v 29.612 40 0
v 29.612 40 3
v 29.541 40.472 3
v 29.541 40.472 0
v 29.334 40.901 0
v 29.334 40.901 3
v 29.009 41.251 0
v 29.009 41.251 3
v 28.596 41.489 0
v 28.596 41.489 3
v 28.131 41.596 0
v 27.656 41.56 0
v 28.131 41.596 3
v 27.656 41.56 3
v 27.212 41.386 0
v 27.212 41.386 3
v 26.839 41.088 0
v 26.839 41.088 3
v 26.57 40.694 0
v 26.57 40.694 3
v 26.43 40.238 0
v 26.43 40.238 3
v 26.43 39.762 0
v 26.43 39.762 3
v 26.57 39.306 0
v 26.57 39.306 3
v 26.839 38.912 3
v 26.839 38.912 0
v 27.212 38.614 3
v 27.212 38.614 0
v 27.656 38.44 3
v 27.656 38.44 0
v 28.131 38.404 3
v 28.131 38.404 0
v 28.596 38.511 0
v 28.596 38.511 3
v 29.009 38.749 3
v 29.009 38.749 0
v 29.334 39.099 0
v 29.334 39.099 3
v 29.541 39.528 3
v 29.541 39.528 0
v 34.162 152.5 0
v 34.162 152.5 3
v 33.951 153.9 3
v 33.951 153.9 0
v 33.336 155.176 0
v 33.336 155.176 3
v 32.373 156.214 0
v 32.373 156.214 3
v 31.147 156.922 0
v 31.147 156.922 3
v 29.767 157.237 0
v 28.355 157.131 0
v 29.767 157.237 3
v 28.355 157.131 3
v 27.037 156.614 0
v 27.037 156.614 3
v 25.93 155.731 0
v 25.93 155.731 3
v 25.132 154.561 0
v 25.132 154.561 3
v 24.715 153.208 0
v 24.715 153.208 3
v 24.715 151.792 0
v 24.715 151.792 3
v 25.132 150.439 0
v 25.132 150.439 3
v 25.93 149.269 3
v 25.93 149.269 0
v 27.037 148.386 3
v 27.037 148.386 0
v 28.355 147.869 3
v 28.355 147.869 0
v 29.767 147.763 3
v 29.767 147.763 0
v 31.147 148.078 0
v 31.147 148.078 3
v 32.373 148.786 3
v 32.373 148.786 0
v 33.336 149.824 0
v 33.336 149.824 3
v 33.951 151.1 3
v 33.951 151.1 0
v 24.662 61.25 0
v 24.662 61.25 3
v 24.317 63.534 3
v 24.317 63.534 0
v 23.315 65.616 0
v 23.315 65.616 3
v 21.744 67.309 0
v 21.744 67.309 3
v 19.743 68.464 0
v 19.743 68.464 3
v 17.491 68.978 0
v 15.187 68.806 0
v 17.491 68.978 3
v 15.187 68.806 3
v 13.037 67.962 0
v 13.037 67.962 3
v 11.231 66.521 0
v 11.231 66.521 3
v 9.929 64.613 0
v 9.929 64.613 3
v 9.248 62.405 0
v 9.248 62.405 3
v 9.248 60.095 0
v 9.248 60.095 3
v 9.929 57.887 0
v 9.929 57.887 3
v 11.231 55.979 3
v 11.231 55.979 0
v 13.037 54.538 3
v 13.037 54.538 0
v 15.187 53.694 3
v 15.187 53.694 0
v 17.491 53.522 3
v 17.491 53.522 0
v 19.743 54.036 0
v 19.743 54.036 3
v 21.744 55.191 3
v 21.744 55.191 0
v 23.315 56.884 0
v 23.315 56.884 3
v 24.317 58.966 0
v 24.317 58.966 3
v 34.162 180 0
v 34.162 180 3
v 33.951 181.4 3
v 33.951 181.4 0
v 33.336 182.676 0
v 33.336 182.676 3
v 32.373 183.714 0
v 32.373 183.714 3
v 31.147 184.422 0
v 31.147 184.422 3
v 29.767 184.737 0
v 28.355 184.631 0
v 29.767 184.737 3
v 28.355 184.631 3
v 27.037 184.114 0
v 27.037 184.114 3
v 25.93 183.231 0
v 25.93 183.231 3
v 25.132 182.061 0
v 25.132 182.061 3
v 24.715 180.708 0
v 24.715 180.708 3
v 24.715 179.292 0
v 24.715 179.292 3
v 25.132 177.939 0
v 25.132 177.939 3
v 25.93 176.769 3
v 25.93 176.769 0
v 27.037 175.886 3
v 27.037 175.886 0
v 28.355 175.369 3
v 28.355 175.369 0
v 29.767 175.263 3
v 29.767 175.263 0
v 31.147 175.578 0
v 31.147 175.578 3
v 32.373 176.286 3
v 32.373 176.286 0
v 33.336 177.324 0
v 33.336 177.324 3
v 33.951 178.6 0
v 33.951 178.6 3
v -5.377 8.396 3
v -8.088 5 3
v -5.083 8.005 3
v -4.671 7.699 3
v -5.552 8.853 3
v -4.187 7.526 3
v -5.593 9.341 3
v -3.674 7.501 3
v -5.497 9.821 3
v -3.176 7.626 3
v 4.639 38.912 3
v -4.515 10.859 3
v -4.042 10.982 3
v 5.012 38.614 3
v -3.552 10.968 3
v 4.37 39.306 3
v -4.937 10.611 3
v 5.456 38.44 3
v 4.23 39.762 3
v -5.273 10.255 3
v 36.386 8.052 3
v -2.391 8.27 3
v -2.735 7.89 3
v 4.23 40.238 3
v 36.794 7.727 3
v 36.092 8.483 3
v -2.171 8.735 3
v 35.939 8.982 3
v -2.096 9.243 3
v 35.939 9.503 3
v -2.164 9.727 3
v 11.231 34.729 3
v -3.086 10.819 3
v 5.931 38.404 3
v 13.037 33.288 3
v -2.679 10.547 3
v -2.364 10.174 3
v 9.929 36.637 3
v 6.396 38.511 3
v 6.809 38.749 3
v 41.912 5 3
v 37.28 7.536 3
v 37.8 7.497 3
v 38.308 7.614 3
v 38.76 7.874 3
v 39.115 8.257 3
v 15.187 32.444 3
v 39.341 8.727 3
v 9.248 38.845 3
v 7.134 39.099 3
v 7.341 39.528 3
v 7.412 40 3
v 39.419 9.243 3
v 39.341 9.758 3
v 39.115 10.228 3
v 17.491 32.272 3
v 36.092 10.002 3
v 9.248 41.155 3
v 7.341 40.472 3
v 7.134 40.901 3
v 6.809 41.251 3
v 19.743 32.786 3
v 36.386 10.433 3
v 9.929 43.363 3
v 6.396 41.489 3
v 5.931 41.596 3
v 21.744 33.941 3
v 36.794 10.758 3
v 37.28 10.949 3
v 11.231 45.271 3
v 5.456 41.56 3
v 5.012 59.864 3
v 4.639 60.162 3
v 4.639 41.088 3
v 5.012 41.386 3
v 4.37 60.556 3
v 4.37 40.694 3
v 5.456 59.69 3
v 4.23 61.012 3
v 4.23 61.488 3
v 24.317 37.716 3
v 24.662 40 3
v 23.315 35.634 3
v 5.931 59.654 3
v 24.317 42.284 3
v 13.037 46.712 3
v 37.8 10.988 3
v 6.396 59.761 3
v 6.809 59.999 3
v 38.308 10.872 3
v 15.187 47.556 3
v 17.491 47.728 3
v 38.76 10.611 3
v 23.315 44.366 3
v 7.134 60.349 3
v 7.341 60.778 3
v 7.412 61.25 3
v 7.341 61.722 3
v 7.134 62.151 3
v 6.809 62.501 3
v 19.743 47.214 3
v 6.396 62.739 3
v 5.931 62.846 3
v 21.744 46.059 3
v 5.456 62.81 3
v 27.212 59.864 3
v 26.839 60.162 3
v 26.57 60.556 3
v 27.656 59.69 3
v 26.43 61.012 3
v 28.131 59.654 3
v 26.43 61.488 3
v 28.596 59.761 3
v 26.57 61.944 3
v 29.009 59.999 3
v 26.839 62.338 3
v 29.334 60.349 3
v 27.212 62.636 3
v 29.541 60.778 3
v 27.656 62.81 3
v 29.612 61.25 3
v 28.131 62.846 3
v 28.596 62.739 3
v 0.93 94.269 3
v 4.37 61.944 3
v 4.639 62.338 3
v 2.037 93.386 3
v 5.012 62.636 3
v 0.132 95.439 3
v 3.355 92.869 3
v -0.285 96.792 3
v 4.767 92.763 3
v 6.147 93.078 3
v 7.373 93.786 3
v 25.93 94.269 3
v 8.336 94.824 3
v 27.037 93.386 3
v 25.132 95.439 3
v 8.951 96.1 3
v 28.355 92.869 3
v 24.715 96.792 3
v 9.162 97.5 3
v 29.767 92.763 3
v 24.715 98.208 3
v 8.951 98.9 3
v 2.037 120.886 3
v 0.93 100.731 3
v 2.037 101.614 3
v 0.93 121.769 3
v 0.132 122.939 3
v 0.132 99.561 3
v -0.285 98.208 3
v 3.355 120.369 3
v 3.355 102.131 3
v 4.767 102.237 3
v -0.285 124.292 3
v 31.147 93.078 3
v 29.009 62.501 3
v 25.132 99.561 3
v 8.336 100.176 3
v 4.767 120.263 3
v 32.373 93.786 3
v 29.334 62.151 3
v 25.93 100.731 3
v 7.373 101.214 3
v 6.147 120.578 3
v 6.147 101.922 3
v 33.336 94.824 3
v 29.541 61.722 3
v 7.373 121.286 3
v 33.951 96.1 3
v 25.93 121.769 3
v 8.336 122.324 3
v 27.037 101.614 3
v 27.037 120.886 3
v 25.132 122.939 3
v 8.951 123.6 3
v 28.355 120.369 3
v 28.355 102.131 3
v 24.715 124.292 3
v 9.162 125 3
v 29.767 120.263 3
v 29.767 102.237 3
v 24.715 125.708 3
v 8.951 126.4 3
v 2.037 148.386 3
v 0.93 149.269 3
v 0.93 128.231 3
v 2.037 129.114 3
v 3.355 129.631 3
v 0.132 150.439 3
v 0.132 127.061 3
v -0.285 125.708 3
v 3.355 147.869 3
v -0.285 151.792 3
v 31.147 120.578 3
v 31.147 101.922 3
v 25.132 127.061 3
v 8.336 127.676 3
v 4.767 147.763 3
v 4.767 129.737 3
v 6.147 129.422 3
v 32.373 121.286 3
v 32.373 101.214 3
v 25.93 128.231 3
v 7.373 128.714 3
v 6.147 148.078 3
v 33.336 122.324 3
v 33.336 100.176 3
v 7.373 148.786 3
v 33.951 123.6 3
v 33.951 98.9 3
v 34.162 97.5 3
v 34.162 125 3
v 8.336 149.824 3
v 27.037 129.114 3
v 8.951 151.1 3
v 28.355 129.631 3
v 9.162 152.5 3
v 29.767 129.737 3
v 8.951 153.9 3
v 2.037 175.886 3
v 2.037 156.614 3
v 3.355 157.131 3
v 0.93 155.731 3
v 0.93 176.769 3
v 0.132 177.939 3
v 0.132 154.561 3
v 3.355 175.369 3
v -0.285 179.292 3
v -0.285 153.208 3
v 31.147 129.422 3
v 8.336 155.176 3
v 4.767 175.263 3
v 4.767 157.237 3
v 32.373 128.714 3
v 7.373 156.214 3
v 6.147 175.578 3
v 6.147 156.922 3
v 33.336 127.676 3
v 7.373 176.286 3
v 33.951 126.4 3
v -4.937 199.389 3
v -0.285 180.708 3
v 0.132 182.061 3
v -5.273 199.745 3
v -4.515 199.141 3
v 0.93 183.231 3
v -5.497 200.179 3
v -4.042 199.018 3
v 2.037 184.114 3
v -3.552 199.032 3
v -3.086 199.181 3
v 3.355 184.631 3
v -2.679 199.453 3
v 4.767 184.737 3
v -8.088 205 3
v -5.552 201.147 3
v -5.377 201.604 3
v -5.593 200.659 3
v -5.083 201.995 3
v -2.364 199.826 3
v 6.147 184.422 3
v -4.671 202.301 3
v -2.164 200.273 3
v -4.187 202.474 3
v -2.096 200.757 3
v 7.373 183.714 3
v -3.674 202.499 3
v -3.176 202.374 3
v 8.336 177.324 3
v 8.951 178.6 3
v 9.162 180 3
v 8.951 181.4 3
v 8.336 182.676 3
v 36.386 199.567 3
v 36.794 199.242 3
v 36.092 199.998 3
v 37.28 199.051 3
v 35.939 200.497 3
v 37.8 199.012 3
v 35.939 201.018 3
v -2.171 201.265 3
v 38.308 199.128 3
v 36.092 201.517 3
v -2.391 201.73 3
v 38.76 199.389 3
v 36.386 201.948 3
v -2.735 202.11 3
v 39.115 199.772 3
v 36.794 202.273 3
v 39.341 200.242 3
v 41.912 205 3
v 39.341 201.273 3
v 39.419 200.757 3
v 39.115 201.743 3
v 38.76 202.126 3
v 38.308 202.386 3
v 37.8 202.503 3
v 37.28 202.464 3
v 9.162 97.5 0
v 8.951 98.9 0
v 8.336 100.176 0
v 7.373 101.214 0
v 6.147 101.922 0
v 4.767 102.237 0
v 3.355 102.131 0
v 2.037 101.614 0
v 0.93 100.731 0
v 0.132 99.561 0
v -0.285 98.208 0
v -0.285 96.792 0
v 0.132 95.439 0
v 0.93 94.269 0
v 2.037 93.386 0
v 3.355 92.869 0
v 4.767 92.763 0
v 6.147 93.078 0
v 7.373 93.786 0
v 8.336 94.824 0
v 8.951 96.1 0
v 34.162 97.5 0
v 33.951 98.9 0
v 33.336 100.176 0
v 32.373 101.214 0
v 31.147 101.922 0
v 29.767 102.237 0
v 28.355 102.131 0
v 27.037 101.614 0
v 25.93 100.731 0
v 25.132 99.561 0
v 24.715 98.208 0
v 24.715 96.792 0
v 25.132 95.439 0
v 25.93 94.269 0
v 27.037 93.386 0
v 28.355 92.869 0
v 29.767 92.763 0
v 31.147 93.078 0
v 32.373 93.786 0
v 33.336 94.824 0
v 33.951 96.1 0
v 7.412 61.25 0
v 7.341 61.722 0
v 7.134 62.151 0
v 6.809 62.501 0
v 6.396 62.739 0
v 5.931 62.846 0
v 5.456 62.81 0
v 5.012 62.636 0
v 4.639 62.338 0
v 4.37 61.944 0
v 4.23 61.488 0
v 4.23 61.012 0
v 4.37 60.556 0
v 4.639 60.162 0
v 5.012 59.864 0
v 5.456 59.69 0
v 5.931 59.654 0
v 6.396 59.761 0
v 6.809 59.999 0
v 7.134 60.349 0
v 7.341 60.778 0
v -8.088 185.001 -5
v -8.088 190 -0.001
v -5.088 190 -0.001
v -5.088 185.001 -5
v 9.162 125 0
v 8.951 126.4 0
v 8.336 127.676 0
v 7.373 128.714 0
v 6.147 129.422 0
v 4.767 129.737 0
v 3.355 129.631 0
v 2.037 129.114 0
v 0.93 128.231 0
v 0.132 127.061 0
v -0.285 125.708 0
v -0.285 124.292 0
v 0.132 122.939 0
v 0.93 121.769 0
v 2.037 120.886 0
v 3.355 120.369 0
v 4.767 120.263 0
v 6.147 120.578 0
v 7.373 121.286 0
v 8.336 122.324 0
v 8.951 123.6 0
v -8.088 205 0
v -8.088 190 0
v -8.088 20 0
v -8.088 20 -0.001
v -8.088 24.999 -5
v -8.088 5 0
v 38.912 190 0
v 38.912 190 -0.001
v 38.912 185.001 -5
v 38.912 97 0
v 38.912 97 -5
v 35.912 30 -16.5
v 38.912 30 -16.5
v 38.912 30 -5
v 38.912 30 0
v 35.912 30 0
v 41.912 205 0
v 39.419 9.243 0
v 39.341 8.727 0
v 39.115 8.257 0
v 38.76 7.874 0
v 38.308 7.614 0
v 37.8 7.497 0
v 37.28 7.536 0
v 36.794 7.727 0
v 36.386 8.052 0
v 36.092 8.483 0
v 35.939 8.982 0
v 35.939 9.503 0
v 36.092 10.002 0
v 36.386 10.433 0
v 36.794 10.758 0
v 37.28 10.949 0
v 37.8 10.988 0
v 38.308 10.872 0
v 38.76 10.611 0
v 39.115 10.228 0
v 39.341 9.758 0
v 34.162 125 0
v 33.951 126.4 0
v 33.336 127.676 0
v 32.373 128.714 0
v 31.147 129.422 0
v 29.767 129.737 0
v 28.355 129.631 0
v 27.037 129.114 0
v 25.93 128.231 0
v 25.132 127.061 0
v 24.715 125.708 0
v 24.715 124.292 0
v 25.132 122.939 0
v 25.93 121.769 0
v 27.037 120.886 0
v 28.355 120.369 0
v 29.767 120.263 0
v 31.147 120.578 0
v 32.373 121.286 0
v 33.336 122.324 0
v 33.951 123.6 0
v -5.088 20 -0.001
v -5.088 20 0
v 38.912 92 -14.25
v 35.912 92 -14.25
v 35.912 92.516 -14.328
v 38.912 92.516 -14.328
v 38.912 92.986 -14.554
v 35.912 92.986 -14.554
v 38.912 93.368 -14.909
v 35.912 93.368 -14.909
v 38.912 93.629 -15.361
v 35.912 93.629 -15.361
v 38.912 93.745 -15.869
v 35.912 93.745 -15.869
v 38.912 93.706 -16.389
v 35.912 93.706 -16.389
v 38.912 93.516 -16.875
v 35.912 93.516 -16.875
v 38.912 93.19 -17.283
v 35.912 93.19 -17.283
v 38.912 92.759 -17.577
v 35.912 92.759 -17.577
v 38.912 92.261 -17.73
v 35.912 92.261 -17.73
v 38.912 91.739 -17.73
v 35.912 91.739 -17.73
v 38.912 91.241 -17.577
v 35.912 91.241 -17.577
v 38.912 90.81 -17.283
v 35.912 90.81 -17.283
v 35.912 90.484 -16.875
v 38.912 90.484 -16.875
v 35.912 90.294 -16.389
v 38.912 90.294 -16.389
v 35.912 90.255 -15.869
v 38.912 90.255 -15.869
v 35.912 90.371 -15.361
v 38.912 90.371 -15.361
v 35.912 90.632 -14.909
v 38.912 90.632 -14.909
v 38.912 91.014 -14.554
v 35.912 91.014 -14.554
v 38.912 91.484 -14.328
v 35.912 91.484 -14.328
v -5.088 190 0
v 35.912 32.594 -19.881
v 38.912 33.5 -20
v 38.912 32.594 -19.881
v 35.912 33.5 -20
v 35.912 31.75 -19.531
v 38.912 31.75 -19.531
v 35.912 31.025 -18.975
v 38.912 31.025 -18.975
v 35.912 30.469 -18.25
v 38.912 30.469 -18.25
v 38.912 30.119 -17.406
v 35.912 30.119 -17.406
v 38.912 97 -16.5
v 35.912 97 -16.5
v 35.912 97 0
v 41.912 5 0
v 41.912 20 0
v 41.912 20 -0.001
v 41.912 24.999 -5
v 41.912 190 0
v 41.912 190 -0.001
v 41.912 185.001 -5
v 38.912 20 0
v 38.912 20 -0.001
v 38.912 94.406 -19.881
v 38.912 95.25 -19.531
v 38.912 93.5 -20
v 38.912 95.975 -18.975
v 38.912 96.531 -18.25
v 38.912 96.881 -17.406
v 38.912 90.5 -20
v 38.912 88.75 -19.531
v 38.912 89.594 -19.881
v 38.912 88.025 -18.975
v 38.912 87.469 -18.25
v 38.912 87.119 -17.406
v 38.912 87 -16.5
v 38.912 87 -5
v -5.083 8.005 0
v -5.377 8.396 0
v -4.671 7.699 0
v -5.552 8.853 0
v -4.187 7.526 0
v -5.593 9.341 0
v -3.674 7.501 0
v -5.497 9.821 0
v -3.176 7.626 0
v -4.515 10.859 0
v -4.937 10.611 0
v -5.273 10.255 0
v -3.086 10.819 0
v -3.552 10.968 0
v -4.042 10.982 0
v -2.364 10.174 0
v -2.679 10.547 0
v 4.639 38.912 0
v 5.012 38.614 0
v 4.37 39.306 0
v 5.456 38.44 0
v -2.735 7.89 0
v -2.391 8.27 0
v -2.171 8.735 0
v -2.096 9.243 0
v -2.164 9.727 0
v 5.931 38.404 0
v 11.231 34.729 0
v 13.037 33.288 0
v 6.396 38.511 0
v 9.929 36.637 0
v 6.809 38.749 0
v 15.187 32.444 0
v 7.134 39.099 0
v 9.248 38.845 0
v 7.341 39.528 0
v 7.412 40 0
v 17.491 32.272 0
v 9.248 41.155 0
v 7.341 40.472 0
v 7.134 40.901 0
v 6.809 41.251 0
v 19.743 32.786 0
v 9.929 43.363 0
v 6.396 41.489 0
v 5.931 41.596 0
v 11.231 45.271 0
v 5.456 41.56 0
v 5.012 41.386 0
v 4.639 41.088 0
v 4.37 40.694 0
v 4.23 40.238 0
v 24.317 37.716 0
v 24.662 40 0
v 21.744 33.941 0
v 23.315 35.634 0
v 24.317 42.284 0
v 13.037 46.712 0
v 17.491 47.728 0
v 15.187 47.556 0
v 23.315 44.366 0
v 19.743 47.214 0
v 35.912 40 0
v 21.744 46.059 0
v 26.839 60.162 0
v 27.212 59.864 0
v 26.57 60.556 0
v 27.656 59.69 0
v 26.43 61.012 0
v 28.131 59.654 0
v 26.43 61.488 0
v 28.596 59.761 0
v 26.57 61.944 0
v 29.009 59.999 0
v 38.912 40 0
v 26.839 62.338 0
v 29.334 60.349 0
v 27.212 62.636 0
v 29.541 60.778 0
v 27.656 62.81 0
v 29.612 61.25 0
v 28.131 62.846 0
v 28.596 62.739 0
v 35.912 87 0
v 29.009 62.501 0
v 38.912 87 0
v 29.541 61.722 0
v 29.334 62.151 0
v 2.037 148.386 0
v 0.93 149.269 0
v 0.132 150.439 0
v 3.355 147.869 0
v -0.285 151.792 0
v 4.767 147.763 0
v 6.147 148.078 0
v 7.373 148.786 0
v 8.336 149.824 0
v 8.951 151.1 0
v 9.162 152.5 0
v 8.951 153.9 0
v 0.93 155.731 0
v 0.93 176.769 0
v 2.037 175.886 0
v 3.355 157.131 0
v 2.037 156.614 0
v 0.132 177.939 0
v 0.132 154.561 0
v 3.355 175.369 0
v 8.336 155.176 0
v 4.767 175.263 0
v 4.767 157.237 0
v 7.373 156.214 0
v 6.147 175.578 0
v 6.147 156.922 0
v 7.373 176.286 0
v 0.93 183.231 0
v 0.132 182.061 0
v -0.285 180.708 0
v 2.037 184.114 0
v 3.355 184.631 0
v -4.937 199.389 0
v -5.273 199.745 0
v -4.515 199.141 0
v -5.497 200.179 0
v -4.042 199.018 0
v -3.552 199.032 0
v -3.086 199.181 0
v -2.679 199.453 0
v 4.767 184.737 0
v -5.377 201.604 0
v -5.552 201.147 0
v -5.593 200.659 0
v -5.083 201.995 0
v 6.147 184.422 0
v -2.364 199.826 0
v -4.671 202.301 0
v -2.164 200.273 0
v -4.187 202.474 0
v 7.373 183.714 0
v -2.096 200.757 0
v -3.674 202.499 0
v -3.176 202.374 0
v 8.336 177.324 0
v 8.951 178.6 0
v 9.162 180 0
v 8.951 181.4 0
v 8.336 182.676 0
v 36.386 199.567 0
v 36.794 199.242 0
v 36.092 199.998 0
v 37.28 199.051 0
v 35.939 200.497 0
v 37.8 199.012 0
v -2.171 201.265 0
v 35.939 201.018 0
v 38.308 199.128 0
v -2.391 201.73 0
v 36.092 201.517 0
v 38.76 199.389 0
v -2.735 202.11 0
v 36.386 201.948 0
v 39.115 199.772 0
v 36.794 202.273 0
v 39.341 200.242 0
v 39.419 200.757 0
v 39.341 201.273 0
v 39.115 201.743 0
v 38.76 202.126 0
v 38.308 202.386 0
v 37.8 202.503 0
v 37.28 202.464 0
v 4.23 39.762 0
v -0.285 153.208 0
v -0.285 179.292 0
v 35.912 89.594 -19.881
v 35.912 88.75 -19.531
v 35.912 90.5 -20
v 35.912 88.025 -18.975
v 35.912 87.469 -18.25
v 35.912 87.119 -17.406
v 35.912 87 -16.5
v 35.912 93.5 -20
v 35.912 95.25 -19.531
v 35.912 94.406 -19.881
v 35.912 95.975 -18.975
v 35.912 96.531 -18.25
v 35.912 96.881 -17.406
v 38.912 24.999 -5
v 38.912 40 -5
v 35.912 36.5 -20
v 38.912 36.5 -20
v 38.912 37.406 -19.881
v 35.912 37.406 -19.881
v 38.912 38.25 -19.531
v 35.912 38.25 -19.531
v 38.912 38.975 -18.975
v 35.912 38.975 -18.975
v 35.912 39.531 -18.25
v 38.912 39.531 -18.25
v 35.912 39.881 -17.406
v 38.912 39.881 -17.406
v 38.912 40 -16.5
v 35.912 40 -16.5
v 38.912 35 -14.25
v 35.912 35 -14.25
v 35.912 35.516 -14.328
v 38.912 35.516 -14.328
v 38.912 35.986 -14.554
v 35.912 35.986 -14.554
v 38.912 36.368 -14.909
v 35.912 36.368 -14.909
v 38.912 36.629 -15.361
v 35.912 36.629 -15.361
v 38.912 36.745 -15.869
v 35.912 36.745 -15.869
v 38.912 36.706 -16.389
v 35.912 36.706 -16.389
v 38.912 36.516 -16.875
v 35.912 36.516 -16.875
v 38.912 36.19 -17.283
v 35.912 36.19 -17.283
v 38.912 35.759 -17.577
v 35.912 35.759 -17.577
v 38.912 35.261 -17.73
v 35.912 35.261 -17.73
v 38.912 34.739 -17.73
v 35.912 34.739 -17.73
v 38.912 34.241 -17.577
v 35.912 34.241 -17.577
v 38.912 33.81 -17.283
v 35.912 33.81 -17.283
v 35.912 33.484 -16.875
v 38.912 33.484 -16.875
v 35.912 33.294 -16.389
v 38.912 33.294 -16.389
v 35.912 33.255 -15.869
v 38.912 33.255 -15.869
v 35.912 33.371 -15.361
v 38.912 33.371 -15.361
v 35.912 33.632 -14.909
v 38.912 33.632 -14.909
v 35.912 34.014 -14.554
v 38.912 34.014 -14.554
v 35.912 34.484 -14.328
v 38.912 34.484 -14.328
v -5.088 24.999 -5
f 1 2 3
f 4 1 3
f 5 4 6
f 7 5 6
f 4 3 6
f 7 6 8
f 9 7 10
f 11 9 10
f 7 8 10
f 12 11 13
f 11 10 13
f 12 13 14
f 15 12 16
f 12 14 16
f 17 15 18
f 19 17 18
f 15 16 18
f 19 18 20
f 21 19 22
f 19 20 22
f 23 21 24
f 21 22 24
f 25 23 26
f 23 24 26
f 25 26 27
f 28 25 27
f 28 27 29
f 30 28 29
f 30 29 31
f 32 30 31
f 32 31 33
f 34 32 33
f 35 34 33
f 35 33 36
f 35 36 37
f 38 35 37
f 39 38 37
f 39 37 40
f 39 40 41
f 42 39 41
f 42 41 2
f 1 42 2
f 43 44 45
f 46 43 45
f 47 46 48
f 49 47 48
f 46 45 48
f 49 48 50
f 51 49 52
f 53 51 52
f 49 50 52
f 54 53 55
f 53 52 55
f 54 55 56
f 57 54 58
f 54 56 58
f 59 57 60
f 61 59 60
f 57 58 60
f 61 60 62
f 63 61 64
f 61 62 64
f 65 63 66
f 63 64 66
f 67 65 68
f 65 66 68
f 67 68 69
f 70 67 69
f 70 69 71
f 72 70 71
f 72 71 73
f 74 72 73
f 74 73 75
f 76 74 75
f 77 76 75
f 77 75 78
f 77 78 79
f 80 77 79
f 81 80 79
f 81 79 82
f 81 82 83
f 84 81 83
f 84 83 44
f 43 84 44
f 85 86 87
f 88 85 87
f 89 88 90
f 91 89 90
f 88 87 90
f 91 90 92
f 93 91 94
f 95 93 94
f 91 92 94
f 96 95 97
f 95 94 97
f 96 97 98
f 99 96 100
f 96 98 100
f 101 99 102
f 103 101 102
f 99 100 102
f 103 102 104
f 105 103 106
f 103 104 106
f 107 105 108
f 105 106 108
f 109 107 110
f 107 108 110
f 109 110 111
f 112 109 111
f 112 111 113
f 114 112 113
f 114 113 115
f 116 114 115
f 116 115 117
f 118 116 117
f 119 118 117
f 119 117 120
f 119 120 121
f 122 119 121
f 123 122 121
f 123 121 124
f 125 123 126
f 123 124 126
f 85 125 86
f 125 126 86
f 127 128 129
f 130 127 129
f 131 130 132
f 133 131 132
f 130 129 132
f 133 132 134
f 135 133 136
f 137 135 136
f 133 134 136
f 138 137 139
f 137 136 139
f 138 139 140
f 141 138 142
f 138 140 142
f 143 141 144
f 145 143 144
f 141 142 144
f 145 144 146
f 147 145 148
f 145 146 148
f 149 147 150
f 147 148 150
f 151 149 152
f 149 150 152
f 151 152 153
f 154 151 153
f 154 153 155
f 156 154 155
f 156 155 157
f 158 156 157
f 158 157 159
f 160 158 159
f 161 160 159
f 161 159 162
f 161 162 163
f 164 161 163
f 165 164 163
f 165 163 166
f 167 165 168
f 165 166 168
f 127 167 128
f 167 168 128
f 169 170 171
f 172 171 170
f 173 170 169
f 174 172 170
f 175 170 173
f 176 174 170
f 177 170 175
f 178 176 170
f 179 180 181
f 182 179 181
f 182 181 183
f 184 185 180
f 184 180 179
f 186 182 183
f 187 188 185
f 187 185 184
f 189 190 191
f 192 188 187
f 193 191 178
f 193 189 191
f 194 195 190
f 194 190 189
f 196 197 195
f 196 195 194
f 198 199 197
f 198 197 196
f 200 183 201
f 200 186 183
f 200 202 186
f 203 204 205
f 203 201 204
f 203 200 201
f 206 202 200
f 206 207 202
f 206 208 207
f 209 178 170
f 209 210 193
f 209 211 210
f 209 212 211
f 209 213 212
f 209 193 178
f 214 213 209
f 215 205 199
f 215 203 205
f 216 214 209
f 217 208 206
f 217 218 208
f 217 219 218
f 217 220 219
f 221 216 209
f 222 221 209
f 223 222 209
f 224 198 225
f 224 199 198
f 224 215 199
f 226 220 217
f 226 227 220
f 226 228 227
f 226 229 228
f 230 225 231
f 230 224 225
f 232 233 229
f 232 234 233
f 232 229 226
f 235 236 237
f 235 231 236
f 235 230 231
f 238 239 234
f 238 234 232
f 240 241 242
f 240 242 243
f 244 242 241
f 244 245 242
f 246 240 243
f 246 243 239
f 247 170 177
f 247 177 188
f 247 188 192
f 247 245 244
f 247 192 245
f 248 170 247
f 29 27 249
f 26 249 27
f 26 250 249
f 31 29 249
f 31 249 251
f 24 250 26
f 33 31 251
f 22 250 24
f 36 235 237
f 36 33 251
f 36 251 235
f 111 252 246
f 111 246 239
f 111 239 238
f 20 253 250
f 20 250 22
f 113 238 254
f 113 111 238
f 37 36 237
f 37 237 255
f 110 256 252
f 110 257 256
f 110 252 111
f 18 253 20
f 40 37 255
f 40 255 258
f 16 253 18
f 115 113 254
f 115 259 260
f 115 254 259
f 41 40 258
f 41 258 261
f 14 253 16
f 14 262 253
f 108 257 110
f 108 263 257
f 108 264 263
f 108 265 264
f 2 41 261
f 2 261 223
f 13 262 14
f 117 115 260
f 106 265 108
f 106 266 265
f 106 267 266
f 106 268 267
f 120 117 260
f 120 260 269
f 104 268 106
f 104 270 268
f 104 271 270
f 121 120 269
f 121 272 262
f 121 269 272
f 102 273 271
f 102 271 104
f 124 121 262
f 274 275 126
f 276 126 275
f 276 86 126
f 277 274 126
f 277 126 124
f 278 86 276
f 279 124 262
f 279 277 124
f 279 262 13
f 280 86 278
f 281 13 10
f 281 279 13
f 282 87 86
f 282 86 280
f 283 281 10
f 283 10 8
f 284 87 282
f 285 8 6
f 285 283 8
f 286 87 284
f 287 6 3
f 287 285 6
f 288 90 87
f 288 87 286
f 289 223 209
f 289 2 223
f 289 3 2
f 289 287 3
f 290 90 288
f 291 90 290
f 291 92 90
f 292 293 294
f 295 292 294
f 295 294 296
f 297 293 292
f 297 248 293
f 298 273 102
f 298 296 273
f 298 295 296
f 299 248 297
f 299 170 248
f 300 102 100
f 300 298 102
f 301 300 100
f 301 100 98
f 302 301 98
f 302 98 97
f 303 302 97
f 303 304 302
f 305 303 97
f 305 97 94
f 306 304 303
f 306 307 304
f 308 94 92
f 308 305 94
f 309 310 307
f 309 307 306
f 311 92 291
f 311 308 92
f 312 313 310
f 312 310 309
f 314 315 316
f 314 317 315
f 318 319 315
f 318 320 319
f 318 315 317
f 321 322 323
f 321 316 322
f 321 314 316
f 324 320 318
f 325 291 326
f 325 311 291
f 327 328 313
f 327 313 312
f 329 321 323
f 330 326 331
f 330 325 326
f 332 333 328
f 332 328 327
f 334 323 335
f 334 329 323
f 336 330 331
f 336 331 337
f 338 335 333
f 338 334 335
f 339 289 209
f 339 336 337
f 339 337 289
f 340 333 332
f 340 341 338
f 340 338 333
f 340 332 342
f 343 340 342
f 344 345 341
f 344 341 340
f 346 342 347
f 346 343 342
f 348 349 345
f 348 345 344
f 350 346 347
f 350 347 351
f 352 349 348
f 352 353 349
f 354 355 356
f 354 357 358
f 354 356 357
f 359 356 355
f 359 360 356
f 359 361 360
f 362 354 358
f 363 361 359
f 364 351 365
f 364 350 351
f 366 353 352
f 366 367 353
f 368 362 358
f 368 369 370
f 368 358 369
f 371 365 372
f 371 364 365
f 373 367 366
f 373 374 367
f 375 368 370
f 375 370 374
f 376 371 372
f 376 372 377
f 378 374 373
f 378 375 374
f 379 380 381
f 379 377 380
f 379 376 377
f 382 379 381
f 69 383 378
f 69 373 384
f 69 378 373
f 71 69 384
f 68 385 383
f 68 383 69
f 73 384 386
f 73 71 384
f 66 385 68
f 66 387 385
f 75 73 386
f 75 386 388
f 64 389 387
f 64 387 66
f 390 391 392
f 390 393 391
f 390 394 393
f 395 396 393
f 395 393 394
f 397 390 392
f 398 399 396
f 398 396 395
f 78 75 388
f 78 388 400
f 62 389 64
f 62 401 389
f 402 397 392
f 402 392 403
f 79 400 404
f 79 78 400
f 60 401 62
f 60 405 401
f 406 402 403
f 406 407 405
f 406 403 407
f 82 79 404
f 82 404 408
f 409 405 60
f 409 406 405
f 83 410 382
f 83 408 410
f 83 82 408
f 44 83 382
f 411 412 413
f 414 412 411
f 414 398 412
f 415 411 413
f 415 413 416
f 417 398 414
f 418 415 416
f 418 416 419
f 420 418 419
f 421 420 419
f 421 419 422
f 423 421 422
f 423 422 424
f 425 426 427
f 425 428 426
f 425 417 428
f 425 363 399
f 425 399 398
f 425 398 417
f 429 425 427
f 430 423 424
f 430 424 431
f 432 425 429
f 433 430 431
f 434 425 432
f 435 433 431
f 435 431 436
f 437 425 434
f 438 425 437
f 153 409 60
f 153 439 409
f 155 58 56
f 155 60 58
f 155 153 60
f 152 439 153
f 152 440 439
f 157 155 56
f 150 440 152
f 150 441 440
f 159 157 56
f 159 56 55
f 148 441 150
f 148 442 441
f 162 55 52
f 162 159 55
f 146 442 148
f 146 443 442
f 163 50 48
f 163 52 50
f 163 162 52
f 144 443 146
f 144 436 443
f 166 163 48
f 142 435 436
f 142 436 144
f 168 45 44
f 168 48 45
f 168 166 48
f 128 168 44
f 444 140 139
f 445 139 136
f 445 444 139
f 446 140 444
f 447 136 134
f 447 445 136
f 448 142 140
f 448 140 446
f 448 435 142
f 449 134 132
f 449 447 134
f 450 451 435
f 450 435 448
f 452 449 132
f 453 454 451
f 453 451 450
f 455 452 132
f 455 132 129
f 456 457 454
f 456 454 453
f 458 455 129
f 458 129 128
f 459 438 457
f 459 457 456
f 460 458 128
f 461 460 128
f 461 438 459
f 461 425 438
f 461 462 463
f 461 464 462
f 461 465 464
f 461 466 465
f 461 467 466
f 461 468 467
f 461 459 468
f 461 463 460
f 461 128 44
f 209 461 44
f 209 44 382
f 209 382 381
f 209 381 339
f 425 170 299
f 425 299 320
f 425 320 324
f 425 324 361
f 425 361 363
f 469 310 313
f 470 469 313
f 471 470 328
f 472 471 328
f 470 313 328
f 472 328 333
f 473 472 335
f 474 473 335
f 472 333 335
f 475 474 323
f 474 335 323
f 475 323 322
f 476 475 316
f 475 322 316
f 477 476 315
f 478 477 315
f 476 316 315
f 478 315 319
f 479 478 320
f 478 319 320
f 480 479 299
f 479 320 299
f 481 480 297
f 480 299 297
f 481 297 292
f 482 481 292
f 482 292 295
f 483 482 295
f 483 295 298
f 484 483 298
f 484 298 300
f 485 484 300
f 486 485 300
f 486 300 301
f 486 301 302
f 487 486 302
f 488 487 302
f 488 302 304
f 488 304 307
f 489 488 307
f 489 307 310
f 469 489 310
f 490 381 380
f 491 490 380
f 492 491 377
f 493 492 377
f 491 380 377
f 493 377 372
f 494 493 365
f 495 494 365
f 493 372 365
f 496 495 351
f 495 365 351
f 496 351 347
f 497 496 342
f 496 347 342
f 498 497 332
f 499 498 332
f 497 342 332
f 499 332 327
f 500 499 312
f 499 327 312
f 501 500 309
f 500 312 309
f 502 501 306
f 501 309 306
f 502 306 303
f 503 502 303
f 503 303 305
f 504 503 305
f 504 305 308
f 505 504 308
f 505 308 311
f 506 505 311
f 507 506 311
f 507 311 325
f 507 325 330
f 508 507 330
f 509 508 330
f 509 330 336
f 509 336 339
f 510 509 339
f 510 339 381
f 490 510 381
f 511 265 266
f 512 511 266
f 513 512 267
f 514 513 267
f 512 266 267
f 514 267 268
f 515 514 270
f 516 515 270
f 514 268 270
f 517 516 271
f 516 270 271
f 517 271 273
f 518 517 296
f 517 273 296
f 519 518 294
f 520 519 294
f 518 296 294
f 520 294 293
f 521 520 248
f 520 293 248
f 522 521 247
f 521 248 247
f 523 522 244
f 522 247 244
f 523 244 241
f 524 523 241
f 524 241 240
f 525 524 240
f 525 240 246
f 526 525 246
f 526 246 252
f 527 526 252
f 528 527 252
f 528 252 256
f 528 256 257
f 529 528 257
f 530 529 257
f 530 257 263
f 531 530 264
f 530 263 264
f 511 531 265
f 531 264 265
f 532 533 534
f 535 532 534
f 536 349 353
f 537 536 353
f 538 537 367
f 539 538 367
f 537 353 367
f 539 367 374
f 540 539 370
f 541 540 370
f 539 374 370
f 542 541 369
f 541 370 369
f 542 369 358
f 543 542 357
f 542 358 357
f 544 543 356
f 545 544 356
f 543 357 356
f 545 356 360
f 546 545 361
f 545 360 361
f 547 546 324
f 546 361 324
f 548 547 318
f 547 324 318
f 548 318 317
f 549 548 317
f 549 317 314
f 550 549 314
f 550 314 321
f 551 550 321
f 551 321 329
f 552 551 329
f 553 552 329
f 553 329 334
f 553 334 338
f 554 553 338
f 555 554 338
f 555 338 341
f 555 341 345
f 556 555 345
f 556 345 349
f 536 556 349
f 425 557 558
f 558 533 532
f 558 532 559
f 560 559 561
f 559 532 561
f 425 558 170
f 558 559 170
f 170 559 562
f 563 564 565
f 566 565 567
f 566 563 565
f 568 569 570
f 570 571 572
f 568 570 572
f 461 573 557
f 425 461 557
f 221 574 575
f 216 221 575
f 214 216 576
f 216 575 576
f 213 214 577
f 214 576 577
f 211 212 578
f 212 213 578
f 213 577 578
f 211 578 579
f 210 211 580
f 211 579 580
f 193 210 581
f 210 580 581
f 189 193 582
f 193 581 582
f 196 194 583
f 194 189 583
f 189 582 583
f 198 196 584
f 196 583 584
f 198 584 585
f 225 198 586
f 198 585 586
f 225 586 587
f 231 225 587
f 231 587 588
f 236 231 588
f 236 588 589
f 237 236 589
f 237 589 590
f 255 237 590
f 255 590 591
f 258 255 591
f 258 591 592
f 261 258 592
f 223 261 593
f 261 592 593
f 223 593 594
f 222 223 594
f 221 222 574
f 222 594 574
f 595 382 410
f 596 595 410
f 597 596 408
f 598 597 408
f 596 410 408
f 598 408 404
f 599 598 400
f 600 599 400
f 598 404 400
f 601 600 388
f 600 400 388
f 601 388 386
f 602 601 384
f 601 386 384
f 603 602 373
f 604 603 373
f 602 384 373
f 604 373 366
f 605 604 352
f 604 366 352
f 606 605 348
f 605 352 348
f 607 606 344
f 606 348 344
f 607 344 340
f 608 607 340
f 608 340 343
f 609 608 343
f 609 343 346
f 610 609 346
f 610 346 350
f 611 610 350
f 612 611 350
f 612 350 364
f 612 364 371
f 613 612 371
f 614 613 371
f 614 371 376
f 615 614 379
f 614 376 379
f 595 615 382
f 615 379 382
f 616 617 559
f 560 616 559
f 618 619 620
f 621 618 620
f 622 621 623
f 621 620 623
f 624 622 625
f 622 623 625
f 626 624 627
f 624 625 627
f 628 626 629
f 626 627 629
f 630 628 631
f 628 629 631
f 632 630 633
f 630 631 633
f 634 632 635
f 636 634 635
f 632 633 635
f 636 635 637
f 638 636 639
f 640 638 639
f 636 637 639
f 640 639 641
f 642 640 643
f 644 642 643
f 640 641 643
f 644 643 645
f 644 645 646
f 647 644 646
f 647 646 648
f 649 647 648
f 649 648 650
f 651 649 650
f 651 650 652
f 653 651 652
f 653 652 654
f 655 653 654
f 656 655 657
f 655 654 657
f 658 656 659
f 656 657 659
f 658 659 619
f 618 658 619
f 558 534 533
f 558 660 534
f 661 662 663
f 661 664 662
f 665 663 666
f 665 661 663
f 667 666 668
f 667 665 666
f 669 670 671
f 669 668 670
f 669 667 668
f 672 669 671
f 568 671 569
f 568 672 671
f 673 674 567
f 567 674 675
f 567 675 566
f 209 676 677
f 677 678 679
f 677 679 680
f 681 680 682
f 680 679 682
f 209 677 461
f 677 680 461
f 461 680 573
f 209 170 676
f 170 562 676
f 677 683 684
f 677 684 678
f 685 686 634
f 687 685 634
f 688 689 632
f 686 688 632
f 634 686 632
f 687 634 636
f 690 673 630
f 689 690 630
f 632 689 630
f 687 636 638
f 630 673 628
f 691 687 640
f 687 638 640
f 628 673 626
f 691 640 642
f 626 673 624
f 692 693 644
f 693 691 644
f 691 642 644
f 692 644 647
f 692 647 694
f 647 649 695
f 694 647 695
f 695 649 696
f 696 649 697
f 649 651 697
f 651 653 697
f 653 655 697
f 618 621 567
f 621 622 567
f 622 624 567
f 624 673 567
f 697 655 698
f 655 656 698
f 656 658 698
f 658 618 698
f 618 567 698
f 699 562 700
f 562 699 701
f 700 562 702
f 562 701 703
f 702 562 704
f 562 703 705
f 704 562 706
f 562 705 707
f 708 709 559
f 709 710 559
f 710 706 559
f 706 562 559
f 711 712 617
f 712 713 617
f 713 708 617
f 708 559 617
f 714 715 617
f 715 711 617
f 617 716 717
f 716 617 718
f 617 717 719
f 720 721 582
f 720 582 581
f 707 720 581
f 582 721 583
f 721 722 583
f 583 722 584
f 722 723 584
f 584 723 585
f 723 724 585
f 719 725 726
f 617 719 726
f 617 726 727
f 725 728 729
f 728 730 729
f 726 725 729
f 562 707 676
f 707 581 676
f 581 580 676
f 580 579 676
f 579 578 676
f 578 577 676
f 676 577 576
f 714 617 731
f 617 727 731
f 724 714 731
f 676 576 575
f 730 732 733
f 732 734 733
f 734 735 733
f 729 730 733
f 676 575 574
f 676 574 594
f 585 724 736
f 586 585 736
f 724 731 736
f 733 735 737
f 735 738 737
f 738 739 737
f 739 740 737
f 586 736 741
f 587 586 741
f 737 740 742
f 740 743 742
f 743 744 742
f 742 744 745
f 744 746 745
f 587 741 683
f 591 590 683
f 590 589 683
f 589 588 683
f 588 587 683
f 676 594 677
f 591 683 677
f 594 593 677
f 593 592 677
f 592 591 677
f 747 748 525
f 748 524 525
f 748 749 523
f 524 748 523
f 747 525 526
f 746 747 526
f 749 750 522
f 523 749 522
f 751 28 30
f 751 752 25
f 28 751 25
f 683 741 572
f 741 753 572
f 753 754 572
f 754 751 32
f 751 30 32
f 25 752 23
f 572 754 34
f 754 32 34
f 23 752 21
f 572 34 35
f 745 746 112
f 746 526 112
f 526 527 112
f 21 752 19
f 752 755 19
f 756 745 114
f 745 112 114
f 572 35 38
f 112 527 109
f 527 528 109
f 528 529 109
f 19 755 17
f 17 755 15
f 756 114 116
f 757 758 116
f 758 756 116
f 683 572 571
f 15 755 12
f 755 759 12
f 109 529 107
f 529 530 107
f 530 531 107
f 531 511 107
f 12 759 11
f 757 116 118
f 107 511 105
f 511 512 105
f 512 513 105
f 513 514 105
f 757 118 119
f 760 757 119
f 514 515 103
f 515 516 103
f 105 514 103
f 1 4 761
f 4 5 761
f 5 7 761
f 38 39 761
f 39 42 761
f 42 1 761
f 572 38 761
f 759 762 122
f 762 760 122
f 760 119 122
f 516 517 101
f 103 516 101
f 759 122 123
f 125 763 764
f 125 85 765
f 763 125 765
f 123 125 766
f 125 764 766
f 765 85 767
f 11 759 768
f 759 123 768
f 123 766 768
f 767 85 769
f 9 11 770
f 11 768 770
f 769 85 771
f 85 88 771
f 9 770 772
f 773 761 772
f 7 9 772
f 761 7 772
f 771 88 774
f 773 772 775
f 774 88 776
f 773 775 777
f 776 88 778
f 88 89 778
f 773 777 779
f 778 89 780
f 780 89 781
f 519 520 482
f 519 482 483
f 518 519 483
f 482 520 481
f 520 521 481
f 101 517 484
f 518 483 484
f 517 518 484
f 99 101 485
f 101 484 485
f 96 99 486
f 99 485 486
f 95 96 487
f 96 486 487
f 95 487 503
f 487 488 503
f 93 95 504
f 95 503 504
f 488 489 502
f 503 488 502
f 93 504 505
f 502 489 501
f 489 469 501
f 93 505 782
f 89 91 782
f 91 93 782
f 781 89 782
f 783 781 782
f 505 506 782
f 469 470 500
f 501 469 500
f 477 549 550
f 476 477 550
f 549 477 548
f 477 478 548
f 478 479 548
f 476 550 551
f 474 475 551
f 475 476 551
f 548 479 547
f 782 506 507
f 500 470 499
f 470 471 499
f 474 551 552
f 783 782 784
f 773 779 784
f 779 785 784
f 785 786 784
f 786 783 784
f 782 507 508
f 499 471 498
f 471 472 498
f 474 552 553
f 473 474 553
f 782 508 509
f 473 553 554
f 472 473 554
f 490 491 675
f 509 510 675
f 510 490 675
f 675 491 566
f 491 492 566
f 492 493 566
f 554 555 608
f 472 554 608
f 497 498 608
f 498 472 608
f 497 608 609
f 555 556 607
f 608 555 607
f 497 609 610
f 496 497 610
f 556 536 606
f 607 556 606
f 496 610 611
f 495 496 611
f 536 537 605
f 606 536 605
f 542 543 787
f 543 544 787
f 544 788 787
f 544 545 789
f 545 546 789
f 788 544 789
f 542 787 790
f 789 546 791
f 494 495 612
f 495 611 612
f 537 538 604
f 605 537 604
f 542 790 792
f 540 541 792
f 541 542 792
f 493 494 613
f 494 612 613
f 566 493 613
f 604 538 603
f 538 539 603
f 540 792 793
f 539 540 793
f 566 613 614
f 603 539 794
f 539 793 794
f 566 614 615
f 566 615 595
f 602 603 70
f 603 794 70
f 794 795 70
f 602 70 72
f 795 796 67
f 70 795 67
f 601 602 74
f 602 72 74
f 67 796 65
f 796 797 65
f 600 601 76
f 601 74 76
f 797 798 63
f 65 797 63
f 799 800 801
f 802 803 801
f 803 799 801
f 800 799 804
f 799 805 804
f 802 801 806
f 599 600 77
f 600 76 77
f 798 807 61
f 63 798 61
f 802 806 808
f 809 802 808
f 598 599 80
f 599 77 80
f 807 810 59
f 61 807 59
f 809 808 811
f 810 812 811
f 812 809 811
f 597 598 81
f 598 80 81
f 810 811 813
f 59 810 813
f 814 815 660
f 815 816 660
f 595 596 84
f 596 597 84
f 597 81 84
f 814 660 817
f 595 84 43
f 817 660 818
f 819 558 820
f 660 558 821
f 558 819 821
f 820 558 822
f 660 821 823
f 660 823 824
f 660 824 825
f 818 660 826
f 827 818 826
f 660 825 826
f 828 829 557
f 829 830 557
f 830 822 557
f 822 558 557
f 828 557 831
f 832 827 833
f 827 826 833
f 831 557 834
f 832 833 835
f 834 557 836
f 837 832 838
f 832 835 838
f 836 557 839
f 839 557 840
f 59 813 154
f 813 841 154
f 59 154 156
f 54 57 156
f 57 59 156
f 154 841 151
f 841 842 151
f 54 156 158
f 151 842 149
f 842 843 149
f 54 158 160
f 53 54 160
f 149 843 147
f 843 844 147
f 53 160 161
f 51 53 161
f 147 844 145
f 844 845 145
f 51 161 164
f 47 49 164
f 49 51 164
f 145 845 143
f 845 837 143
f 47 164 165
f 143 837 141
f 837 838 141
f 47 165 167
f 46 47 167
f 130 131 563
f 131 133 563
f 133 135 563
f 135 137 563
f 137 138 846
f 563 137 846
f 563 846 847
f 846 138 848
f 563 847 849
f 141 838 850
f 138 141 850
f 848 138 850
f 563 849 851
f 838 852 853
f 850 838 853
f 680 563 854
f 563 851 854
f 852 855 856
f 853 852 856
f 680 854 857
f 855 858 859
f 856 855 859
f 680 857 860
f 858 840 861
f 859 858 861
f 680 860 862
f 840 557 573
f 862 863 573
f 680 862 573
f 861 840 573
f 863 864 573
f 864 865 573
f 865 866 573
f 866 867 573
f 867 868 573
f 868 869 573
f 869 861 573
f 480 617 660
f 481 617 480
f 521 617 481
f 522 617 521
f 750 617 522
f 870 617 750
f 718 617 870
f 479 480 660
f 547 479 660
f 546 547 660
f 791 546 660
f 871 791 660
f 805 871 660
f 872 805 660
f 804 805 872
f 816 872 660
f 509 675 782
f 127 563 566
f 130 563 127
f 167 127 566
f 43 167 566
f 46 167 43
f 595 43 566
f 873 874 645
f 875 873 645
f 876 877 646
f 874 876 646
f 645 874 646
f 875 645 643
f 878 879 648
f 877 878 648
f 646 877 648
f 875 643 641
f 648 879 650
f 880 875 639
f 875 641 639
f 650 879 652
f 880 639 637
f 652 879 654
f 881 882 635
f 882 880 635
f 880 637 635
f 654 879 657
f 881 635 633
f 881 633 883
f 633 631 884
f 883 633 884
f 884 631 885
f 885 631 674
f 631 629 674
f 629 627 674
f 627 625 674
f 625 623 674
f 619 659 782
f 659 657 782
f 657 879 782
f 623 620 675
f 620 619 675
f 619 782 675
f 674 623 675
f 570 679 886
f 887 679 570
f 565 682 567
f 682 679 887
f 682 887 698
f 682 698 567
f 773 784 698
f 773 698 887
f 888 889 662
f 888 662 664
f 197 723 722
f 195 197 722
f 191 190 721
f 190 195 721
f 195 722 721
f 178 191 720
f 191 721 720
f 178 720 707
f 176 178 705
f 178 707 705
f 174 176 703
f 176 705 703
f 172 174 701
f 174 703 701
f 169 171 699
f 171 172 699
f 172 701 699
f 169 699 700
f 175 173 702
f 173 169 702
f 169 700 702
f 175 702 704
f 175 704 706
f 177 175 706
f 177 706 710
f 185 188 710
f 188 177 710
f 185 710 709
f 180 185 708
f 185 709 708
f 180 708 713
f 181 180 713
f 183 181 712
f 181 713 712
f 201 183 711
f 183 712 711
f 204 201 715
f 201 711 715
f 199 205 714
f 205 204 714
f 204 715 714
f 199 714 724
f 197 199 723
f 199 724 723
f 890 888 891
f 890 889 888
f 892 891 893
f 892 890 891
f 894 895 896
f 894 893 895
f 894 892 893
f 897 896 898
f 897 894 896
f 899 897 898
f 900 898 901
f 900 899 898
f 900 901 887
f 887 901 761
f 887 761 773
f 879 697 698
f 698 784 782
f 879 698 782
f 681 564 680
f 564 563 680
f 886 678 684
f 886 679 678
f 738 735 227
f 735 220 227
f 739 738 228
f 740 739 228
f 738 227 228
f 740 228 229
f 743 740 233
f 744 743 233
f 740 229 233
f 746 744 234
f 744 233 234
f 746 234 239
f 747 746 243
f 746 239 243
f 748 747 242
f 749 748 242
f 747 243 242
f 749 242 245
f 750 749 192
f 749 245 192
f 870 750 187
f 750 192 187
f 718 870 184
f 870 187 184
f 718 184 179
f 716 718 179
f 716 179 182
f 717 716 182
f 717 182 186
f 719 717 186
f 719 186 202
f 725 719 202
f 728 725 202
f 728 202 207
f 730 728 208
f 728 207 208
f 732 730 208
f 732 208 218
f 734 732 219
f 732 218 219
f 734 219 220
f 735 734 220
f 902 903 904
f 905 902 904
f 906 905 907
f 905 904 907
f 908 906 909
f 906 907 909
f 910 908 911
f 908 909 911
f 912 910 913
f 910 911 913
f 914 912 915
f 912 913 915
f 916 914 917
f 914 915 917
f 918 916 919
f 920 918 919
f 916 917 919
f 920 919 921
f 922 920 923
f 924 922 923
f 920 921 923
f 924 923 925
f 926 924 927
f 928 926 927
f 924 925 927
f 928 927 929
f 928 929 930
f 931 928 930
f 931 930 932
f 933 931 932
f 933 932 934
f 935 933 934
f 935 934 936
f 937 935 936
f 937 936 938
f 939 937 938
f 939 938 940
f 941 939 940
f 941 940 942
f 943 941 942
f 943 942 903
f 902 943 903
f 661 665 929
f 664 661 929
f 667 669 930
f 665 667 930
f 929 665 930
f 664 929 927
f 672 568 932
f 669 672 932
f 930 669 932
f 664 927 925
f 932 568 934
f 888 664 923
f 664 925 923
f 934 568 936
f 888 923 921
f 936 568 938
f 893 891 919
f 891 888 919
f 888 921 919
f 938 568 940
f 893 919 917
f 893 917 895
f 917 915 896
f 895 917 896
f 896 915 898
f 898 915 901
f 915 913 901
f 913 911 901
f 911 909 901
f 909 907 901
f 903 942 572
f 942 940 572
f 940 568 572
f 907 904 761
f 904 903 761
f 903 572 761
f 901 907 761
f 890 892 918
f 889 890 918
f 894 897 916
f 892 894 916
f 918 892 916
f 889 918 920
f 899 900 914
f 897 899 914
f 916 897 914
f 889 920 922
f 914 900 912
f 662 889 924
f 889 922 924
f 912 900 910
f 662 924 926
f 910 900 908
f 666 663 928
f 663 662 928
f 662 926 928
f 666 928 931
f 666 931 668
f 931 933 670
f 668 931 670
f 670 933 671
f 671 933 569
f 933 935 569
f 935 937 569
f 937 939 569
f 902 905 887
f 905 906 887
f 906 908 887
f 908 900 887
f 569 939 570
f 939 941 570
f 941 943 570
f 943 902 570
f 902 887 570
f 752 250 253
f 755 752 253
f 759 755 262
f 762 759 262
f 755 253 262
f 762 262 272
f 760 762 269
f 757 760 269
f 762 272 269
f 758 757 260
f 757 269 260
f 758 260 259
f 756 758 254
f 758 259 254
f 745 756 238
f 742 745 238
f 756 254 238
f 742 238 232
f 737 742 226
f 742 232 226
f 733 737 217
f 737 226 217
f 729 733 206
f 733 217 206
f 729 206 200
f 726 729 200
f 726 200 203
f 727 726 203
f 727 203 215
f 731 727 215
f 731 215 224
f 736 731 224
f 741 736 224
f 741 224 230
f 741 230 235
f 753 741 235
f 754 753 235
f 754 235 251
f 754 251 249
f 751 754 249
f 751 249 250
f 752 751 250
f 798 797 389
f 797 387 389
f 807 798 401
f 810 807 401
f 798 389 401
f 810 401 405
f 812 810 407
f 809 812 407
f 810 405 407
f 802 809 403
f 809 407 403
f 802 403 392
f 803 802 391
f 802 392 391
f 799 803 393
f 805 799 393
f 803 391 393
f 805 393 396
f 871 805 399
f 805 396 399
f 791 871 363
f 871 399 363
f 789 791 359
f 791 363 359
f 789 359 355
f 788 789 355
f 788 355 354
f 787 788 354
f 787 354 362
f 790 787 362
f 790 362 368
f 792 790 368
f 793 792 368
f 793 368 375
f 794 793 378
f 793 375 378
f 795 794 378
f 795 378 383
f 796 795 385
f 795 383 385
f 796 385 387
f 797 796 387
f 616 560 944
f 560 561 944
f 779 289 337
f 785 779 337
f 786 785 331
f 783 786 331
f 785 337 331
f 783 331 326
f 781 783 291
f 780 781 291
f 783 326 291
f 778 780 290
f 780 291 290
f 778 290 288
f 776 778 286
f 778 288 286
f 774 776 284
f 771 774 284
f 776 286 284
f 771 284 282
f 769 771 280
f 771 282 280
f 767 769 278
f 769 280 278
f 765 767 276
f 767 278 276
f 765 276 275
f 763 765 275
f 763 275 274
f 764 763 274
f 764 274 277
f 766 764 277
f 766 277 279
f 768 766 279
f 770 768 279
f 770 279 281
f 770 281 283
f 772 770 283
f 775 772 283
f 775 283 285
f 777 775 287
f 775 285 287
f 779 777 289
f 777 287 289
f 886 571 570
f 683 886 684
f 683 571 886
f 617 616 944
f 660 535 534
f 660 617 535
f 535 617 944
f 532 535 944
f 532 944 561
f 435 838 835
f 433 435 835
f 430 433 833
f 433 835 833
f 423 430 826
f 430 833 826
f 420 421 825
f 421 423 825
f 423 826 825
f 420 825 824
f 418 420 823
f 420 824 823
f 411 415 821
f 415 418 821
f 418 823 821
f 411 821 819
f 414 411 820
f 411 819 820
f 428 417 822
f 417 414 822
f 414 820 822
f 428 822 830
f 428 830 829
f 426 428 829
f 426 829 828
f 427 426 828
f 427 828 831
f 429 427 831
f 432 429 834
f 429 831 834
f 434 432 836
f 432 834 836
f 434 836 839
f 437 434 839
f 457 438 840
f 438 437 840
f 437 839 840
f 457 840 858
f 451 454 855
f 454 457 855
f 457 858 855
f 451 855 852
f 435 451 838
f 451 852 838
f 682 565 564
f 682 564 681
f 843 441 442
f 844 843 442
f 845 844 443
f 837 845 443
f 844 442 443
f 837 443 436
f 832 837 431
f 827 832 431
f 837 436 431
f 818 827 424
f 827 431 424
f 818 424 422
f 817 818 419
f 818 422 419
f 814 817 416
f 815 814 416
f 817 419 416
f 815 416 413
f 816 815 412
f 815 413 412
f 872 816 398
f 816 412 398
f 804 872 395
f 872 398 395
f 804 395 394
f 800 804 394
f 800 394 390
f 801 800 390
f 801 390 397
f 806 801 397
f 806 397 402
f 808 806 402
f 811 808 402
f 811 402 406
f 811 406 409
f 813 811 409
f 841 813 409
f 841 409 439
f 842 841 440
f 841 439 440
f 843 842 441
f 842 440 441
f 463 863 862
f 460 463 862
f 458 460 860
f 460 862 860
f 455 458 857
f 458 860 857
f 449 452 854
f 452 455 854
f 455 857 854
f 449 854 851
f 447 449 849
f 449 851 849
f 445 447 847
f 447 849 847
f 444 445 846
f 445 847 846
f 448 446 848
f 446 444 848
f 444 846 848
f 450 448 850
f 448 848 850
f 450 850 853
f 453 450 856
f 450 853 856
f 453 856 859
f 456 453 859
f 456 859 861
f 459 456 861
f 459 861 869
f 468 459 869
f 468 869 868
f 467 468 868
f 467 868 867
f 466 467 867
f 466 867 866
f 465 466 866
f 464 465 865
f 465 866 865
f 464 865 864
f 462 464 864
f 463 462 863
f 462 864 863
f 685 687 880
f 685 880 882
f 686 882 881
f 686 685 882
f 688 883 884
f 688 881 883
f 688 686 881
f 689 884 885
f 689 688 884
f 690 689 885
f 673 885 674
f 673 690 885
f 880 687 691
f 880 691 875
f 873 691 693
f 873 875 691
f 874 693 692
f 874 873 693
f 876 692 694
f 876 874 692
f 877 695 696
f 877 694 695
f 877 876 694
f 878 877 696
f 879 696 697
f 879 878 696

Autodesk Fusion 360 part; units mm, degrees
sketch "Sketch1" plane through (0, 0, 0) normal (0, 0, 1) x (1, 0, 0)
  line L0 (-8.0882, 5) -> (41.9118, 5)
  line L1 (41.9118, 5) -> (41.9118, 205)
  line L2 (41.9118, 205) -> (-8.0882, 205)
  line L3 (-8.0882, 205) -> (-8.0882, 5)
  line L4 (-8.0882, 205) -> (-3.8456, 200.7574)
  line L5 (-8.0882, 205) -> (6, 205) construction
  line L6 (-8.0882, 5) -> (-3.8456, 9.2426)
  line L7 (-8.0882, 5) -> (6, 5) construction
  line L8 (16.9118, 205) -> (16.9118, 5)
  circle A0 centre (-3.8456, 200.7574) radius 1.75
  circle A1 centre (-3.8456, 9.2426) radius 1.75
  circle A2 centre (37.6691, 200.7574) radius 1.75
  circle A3 centre (37.6691, 9.2426) radius 1.75
  dimension "d1" = 200
  dimension "d2" = 50
  dimension "d3" = 6
  dimension "d4" = 45
  dimension "d5" = 45
  dimension "d6" = 6
  dimension "d7" = 3.5
  dimension "d8" = 3.5
extrude "Extrude1" add sketch "Sketch1" along normal blind 3
sketch "Sketch2" plane through (0, 0, 3) normal (0, 0, 1) x (1, 0, 0)
  circle A0 centre (-3.8456, 200.7574) radius 1.75
  circle A1 centre (37.6691, 9.2426) radius 1.75
  circle A2 centre (-3.8456, 9.2426) radius 1.75
  circle A3 centre (37.6691, 200.7574) radius 1.75
  line L0 (-8.0882, 205) -> (-8.0882, 5)
  line L1 (-8.0882, 5) -> (41.9118, 5)
  line L2 (41.9118, 5) -> (41.9118, 205)
  line L3 (41.9118, 205) -> (-8.0882, 205)
  line L4 (41.9118, 5) -> (29.4118, 5)
  line L5 (29.4118, 205) -> (41.9118, 205)
  line L6 (41.9118, 205) -> (41.9118, 5)
  line L7 (-8.0882, 5) -> (4.4118, 5)
  line L8 (4.4118, 205) -> (-8.0882, 205)
  line L9 (-8.0882, 205) -> (-8.0882, 5)
  line L10 (-8.0882, 205) -> (-8.0882, 180)
  line L11 (-8.0882, 5) -> (-8.0882, 30)
  circle A4 centre (4.4118, 180) radius 4.75
  circle A5 centre (4.4118, 152.5) radius 4.75
  circle A6 centre (4.4118, 125) radius 4.75
  circle A7 centre (4.4118, 97.5) radius 4.75
  circle A8 centre (29.4118, 152.5) radius 4.75
  circle A9 centre (29.4118, 125) radius 4.75
  circle A10 centre (29.4118, 180) radius 4.75
  circle A11 centre (29.4118, 97.5) radius 4.75
  circle A12 centre (16.9118, 61.25) radius 7.75
  circle A13 centre (5.8118, 61.25) radius 1.6
  circle A14 centre (28.0118, 61.25) radius 1.6
  line L12 (16.9118, 50.625) -> (-8.0882, 50.625)
  line L13 (-8.0882, 50.625) -> (41.9118, 50.625)
  circle A15 centre (16.9118, 40) radius 7.75
  circle A16 centre (28.0118, 40) radius 1.6
  circle A17 centre (5.8118, 40) radius 1.6
  point P0 (28.0118, 40)
  point P1 (5.8118, 40)
  dimension "d11" = 12.5
  dimension "d12" = 200
  dimension "d13" = 12.5
  dimension "d14" = 200
  dimension "d15" = 9.5
  dimension "d17" = 27.5
  dimension "d18" = 9.5
  dimension "d19" = 27.5
  dimension "d20" = 9.5
  dimension "d21" = 27.5
  dimension "d22" = 9.5
  dimension "d23" = 92.5
  dimension "d25" = 15.5
  dimension "d26" = 11.1
  dimension "d27" = 3.2
extrude "Extrude2" cut sketch "Sketch2" against normal blind 3 contours A4 | A5 | A6 | A7 | A8 | A9 | A10 | A11 | A12 | A13 | A14
sketch "Sketch3" plane through (0, 0, 0) normal (0, 0, -1) x (-1, 0, 0)
  circle A0 centre (-4.4118, 152.5) radius 4.75
  circle A1 centre (-29.4118, 97.5) radius 4.75
  circle A2 centre (-16.9118, 61.25) radius 7.75
  circle A3 centre (-4.4118, 97.5) radius 4.75
  circle A4 centre (-29.4118, 152.5) radius 4.75
  circle A5 centre (-4.4118, 180) radius 4.75
  circle A6 centre (-29.4118, 125) radius 4.75
  circle A7 centre (-28.0118, 61.25) radius 1.6
  circle A8 centre (-5.8118, 61.25) radius 1.6
  circle A9 centre (-4.4118, 125) radius 4.75
  circle A10 centre (-29.4118, 180) radius 4.75
  circle A11 centre (3.8456, 200.7574) radius 1.75
  circle A12 centre (-37.6691, 9.2426) radius 1.75
  circle A13 centre (3.8456, 9.2426) radius 1.75
  circle A14 centre (-37.6691, 200.7574) radius 1.75
  line L0 (8.0882, 5) -> (8.0882, 205)
  line L1 (8.0882, 205) -> (-41.9118, 205)
  line L2 (-41.9118, 205) -> (-41.9118, 5)
  line L3 (-41.9118, 5) -> (8.0882, 5)
  line L4 (-41.9118, 205) -> (-38.9118, 205)
  line L5 (-38.9118, 205) -> (-38.9118, 190)
  line L6 (-38.9118, 190) -> (-41.9118, 190)
  line L7 (-41.9118, 190) -> (-41.9118, 205)
  line L8 (-16.9118, 205) -> (-16.9118, 5)
  line L9 (8.0882, 205) -> (5.0882, 205)
  line L10 (5.0882, 205) -> (5.0882, 190)
  line L11 (5.0882, 190) -> (8.0882, 190)
  line L12 (8.0882, 190) -> (8.0882, 205)
  line L13 (-41.9118, 5) -> (-38.9118, 5)
  line L14 (-38.9118, 5) -> (-38.9118, 20)
  line L15 (-38.9118, 20) -> (-41.9118, 20)
  line L16 (-41.9118, 20) -> (-41.9118, 5)
  line L17 (8.0882, 5) -> (5.0882, 5)
  line L18 (5.0882, 5) -> (5.0882, 20)
  line L19 (5.0882, 20) -> (8.0882, 20)
  line L20 (8.0882, 20) -> (8.0882, 5)
  line L21 (-41.9118, 190) -> (-38.9118, 190)
  line L22 (-38.9118, 190) -> (-38.9118, 20)
  line L23 (-38.9118, 20) -> (-41.9118, 20)
  line L24 (-41.9118, 20) -> (-41.9118, 190)
  line L25 (5.0882, 190) -> (8.0882, 190)
  line L26 (8.0882, 190) -> (8.0882, 20)
  line L27 (8.0882, 20) -> (5.0882, 20)
  line L28 (5.0882, 20) -> (5.0882, 190)
  dimension "d30" = 3
  dimension "d31" = 15
  dimension "d32" = 3
  dimension "d33" = 15
  dimension "d34" = 3
  dimension "d35" = 15
  dimension "d36" = 3
  dimension "d37" = 15
extrude "Extrude3" add sketch "Sketch3" along normal blind 5 contours L0 L11 L19 L25 L26 L27 L28 | L2 L6 L15 L21 L22 L23 L24
sketch "Sketch4" plane through (0, 0, 0) normal (0, 0, -1) x (-1, 0, 0)
  circle A0 centre (-37.6691, 200.7574) radius 1.75
  circle A1 centre (3.8456, 9.2426) radius 1.75
  circle A2 centre (-37.6691, 9.2426) radius 1.75
  circle A3 centre (3.8456, 200.7574) radius 1.75
  circle A4 centre (-29.4118, 180) radius 4.75
  circle A5 centre (-4.4118, 125) radius 4.75
  circle A6 centre (-5.8118, 61.25) radius 1.6
  circle A7 centre (-28.0118, 61.25) radius 1.6
  circle A8 centre (-29.4118, 125) radius 4.75
  circle A9 centre (-4.4118, 180) radius 4.75
  circle A10 centre (-29.4118, 152.5) radius 4.75
  circle A11 centre (-4.4118, 97.5) radius 4.75
  circle A12 centre (-16.9118, 61.25) radius 7.75
  circle A13 centre (-29.4118, 97.5) radius 4.75
  circle A14 centre (-4.4118, 152.5) radius 4.75
  line L0 (-41.9118, 190) -> (-38.9118, 190)
  line L1 (-38.9118, 190) -> (-38.9118, 20)
  line L2 (-38.9118, 20) -> (-41.9118, 20)
  line L3 (-41.9118, 20) -> (-41.9118, 5)
  line L4 (-41.9118, 5) -> (8.0882, 5)
  line L5 (8.0882, 5) -> (8.0882, 20)
  line L6 (8.0882, 20) -> (5.0882, 20)
  line L7 (5.0882, 20) -> (5.0882, 190)
  line L8 (5.0882, 190) -> (8.0882, 190)
  line L9 (8.0882, 190) -> (8.0882, 205)
  line L10 (8.0882, 205) -> (-41.9118, 205)
  line L11 (-41.9118, 205) -> (-41.9118, 190)
  line L12 (-38.9118, 20) -> (-38.9118, 30)
  line L13 (-38.9118, 30) -> (-35.9118, 30)
  line L14 (-35.9118, 30) -> (-35.9118, 40)
  line L15 (-35.9118, 40) -> (-38.9118, 40)
  line L16 (-38.9118, 40) -> (-38.9118, 30)
  line L17 (-38.9118, 40) -> (-38.9118, 87)
  line L18 (-38.9118, 87) -> (-35.9118, 87)
  line L19 (-35.9118, 87) -> (-35.9118, 97)
  line L20 (-35.9118, 97) -> (-38.9118, 97)
  line L21 (-38.9118, 97) -> (-38.9118, 87)
  dimension "d40" = 3
  dimension "d41" = 10
  dimension "d42" = 47
  dimension "d43" = 3
  dimension "d44" = 10
extrude "Extrude4" add sketch "Sketch4" along normal blind 20 contours L1 L18 L19 L20 L21 | L1 L13 L14 L15 L16
fillet "Fillet1" radius 3.5 4 edges at (37.4118, 87, -20) (37.4118, 97, -20) (37.4118, 30, -20) (37.4118, 40, -20)
chamfer "Chamfer1" distance 5 angle 45 2 edges at (40.4118, 20, -5) (-6.5882, 20, -5)
chamfer "Chamfer2" distance 5 angle 45 2 edges at (-6.5882, 190, -5) (40.4118, 190, -5)
sketch "Sketch5" plane through (35.9118, 0, 0) normal (-1, 0, 0) x (0, 0, 1)
  arc A0 (-16.5, 97) -> (-20, 93.5) centre (-16.5, 93.5) ccw
  line L0 (-20, 93.5) -> (-20, 90.5)
  arc A1 (-20, 90.5) -> (-16.5, 87) centre (-16.5, 90.5) ccw
  line L1 (-16.5, 87) -> (0, 87)
  line L2 (0, 87) -> (0, 97)
  line L3 (0, 97) -> (-16.5, 97)
  line L4 (-20, 92) -> (-16, 92)
  circle A2 centre (-16, 92) radius 1.75
  line L5 (-20, 35) -> (-16, 35)
  circle A3 centre (-16, 35) radius 1.75
  dimension "d50" = 4
  dimension "d51" = 3.5
  dimension "d52" = 3.5
extrude "Extrude5" cut sketch "Sketch5" against normal blind 5 contours A2 | A3
extrude "Extrude6" cut sketch "Sketch2" against normal blind 3 contours A15
extrude "Extrude7" cut sketch "Sketch2" against normal blind 3 contours A16 | A17
